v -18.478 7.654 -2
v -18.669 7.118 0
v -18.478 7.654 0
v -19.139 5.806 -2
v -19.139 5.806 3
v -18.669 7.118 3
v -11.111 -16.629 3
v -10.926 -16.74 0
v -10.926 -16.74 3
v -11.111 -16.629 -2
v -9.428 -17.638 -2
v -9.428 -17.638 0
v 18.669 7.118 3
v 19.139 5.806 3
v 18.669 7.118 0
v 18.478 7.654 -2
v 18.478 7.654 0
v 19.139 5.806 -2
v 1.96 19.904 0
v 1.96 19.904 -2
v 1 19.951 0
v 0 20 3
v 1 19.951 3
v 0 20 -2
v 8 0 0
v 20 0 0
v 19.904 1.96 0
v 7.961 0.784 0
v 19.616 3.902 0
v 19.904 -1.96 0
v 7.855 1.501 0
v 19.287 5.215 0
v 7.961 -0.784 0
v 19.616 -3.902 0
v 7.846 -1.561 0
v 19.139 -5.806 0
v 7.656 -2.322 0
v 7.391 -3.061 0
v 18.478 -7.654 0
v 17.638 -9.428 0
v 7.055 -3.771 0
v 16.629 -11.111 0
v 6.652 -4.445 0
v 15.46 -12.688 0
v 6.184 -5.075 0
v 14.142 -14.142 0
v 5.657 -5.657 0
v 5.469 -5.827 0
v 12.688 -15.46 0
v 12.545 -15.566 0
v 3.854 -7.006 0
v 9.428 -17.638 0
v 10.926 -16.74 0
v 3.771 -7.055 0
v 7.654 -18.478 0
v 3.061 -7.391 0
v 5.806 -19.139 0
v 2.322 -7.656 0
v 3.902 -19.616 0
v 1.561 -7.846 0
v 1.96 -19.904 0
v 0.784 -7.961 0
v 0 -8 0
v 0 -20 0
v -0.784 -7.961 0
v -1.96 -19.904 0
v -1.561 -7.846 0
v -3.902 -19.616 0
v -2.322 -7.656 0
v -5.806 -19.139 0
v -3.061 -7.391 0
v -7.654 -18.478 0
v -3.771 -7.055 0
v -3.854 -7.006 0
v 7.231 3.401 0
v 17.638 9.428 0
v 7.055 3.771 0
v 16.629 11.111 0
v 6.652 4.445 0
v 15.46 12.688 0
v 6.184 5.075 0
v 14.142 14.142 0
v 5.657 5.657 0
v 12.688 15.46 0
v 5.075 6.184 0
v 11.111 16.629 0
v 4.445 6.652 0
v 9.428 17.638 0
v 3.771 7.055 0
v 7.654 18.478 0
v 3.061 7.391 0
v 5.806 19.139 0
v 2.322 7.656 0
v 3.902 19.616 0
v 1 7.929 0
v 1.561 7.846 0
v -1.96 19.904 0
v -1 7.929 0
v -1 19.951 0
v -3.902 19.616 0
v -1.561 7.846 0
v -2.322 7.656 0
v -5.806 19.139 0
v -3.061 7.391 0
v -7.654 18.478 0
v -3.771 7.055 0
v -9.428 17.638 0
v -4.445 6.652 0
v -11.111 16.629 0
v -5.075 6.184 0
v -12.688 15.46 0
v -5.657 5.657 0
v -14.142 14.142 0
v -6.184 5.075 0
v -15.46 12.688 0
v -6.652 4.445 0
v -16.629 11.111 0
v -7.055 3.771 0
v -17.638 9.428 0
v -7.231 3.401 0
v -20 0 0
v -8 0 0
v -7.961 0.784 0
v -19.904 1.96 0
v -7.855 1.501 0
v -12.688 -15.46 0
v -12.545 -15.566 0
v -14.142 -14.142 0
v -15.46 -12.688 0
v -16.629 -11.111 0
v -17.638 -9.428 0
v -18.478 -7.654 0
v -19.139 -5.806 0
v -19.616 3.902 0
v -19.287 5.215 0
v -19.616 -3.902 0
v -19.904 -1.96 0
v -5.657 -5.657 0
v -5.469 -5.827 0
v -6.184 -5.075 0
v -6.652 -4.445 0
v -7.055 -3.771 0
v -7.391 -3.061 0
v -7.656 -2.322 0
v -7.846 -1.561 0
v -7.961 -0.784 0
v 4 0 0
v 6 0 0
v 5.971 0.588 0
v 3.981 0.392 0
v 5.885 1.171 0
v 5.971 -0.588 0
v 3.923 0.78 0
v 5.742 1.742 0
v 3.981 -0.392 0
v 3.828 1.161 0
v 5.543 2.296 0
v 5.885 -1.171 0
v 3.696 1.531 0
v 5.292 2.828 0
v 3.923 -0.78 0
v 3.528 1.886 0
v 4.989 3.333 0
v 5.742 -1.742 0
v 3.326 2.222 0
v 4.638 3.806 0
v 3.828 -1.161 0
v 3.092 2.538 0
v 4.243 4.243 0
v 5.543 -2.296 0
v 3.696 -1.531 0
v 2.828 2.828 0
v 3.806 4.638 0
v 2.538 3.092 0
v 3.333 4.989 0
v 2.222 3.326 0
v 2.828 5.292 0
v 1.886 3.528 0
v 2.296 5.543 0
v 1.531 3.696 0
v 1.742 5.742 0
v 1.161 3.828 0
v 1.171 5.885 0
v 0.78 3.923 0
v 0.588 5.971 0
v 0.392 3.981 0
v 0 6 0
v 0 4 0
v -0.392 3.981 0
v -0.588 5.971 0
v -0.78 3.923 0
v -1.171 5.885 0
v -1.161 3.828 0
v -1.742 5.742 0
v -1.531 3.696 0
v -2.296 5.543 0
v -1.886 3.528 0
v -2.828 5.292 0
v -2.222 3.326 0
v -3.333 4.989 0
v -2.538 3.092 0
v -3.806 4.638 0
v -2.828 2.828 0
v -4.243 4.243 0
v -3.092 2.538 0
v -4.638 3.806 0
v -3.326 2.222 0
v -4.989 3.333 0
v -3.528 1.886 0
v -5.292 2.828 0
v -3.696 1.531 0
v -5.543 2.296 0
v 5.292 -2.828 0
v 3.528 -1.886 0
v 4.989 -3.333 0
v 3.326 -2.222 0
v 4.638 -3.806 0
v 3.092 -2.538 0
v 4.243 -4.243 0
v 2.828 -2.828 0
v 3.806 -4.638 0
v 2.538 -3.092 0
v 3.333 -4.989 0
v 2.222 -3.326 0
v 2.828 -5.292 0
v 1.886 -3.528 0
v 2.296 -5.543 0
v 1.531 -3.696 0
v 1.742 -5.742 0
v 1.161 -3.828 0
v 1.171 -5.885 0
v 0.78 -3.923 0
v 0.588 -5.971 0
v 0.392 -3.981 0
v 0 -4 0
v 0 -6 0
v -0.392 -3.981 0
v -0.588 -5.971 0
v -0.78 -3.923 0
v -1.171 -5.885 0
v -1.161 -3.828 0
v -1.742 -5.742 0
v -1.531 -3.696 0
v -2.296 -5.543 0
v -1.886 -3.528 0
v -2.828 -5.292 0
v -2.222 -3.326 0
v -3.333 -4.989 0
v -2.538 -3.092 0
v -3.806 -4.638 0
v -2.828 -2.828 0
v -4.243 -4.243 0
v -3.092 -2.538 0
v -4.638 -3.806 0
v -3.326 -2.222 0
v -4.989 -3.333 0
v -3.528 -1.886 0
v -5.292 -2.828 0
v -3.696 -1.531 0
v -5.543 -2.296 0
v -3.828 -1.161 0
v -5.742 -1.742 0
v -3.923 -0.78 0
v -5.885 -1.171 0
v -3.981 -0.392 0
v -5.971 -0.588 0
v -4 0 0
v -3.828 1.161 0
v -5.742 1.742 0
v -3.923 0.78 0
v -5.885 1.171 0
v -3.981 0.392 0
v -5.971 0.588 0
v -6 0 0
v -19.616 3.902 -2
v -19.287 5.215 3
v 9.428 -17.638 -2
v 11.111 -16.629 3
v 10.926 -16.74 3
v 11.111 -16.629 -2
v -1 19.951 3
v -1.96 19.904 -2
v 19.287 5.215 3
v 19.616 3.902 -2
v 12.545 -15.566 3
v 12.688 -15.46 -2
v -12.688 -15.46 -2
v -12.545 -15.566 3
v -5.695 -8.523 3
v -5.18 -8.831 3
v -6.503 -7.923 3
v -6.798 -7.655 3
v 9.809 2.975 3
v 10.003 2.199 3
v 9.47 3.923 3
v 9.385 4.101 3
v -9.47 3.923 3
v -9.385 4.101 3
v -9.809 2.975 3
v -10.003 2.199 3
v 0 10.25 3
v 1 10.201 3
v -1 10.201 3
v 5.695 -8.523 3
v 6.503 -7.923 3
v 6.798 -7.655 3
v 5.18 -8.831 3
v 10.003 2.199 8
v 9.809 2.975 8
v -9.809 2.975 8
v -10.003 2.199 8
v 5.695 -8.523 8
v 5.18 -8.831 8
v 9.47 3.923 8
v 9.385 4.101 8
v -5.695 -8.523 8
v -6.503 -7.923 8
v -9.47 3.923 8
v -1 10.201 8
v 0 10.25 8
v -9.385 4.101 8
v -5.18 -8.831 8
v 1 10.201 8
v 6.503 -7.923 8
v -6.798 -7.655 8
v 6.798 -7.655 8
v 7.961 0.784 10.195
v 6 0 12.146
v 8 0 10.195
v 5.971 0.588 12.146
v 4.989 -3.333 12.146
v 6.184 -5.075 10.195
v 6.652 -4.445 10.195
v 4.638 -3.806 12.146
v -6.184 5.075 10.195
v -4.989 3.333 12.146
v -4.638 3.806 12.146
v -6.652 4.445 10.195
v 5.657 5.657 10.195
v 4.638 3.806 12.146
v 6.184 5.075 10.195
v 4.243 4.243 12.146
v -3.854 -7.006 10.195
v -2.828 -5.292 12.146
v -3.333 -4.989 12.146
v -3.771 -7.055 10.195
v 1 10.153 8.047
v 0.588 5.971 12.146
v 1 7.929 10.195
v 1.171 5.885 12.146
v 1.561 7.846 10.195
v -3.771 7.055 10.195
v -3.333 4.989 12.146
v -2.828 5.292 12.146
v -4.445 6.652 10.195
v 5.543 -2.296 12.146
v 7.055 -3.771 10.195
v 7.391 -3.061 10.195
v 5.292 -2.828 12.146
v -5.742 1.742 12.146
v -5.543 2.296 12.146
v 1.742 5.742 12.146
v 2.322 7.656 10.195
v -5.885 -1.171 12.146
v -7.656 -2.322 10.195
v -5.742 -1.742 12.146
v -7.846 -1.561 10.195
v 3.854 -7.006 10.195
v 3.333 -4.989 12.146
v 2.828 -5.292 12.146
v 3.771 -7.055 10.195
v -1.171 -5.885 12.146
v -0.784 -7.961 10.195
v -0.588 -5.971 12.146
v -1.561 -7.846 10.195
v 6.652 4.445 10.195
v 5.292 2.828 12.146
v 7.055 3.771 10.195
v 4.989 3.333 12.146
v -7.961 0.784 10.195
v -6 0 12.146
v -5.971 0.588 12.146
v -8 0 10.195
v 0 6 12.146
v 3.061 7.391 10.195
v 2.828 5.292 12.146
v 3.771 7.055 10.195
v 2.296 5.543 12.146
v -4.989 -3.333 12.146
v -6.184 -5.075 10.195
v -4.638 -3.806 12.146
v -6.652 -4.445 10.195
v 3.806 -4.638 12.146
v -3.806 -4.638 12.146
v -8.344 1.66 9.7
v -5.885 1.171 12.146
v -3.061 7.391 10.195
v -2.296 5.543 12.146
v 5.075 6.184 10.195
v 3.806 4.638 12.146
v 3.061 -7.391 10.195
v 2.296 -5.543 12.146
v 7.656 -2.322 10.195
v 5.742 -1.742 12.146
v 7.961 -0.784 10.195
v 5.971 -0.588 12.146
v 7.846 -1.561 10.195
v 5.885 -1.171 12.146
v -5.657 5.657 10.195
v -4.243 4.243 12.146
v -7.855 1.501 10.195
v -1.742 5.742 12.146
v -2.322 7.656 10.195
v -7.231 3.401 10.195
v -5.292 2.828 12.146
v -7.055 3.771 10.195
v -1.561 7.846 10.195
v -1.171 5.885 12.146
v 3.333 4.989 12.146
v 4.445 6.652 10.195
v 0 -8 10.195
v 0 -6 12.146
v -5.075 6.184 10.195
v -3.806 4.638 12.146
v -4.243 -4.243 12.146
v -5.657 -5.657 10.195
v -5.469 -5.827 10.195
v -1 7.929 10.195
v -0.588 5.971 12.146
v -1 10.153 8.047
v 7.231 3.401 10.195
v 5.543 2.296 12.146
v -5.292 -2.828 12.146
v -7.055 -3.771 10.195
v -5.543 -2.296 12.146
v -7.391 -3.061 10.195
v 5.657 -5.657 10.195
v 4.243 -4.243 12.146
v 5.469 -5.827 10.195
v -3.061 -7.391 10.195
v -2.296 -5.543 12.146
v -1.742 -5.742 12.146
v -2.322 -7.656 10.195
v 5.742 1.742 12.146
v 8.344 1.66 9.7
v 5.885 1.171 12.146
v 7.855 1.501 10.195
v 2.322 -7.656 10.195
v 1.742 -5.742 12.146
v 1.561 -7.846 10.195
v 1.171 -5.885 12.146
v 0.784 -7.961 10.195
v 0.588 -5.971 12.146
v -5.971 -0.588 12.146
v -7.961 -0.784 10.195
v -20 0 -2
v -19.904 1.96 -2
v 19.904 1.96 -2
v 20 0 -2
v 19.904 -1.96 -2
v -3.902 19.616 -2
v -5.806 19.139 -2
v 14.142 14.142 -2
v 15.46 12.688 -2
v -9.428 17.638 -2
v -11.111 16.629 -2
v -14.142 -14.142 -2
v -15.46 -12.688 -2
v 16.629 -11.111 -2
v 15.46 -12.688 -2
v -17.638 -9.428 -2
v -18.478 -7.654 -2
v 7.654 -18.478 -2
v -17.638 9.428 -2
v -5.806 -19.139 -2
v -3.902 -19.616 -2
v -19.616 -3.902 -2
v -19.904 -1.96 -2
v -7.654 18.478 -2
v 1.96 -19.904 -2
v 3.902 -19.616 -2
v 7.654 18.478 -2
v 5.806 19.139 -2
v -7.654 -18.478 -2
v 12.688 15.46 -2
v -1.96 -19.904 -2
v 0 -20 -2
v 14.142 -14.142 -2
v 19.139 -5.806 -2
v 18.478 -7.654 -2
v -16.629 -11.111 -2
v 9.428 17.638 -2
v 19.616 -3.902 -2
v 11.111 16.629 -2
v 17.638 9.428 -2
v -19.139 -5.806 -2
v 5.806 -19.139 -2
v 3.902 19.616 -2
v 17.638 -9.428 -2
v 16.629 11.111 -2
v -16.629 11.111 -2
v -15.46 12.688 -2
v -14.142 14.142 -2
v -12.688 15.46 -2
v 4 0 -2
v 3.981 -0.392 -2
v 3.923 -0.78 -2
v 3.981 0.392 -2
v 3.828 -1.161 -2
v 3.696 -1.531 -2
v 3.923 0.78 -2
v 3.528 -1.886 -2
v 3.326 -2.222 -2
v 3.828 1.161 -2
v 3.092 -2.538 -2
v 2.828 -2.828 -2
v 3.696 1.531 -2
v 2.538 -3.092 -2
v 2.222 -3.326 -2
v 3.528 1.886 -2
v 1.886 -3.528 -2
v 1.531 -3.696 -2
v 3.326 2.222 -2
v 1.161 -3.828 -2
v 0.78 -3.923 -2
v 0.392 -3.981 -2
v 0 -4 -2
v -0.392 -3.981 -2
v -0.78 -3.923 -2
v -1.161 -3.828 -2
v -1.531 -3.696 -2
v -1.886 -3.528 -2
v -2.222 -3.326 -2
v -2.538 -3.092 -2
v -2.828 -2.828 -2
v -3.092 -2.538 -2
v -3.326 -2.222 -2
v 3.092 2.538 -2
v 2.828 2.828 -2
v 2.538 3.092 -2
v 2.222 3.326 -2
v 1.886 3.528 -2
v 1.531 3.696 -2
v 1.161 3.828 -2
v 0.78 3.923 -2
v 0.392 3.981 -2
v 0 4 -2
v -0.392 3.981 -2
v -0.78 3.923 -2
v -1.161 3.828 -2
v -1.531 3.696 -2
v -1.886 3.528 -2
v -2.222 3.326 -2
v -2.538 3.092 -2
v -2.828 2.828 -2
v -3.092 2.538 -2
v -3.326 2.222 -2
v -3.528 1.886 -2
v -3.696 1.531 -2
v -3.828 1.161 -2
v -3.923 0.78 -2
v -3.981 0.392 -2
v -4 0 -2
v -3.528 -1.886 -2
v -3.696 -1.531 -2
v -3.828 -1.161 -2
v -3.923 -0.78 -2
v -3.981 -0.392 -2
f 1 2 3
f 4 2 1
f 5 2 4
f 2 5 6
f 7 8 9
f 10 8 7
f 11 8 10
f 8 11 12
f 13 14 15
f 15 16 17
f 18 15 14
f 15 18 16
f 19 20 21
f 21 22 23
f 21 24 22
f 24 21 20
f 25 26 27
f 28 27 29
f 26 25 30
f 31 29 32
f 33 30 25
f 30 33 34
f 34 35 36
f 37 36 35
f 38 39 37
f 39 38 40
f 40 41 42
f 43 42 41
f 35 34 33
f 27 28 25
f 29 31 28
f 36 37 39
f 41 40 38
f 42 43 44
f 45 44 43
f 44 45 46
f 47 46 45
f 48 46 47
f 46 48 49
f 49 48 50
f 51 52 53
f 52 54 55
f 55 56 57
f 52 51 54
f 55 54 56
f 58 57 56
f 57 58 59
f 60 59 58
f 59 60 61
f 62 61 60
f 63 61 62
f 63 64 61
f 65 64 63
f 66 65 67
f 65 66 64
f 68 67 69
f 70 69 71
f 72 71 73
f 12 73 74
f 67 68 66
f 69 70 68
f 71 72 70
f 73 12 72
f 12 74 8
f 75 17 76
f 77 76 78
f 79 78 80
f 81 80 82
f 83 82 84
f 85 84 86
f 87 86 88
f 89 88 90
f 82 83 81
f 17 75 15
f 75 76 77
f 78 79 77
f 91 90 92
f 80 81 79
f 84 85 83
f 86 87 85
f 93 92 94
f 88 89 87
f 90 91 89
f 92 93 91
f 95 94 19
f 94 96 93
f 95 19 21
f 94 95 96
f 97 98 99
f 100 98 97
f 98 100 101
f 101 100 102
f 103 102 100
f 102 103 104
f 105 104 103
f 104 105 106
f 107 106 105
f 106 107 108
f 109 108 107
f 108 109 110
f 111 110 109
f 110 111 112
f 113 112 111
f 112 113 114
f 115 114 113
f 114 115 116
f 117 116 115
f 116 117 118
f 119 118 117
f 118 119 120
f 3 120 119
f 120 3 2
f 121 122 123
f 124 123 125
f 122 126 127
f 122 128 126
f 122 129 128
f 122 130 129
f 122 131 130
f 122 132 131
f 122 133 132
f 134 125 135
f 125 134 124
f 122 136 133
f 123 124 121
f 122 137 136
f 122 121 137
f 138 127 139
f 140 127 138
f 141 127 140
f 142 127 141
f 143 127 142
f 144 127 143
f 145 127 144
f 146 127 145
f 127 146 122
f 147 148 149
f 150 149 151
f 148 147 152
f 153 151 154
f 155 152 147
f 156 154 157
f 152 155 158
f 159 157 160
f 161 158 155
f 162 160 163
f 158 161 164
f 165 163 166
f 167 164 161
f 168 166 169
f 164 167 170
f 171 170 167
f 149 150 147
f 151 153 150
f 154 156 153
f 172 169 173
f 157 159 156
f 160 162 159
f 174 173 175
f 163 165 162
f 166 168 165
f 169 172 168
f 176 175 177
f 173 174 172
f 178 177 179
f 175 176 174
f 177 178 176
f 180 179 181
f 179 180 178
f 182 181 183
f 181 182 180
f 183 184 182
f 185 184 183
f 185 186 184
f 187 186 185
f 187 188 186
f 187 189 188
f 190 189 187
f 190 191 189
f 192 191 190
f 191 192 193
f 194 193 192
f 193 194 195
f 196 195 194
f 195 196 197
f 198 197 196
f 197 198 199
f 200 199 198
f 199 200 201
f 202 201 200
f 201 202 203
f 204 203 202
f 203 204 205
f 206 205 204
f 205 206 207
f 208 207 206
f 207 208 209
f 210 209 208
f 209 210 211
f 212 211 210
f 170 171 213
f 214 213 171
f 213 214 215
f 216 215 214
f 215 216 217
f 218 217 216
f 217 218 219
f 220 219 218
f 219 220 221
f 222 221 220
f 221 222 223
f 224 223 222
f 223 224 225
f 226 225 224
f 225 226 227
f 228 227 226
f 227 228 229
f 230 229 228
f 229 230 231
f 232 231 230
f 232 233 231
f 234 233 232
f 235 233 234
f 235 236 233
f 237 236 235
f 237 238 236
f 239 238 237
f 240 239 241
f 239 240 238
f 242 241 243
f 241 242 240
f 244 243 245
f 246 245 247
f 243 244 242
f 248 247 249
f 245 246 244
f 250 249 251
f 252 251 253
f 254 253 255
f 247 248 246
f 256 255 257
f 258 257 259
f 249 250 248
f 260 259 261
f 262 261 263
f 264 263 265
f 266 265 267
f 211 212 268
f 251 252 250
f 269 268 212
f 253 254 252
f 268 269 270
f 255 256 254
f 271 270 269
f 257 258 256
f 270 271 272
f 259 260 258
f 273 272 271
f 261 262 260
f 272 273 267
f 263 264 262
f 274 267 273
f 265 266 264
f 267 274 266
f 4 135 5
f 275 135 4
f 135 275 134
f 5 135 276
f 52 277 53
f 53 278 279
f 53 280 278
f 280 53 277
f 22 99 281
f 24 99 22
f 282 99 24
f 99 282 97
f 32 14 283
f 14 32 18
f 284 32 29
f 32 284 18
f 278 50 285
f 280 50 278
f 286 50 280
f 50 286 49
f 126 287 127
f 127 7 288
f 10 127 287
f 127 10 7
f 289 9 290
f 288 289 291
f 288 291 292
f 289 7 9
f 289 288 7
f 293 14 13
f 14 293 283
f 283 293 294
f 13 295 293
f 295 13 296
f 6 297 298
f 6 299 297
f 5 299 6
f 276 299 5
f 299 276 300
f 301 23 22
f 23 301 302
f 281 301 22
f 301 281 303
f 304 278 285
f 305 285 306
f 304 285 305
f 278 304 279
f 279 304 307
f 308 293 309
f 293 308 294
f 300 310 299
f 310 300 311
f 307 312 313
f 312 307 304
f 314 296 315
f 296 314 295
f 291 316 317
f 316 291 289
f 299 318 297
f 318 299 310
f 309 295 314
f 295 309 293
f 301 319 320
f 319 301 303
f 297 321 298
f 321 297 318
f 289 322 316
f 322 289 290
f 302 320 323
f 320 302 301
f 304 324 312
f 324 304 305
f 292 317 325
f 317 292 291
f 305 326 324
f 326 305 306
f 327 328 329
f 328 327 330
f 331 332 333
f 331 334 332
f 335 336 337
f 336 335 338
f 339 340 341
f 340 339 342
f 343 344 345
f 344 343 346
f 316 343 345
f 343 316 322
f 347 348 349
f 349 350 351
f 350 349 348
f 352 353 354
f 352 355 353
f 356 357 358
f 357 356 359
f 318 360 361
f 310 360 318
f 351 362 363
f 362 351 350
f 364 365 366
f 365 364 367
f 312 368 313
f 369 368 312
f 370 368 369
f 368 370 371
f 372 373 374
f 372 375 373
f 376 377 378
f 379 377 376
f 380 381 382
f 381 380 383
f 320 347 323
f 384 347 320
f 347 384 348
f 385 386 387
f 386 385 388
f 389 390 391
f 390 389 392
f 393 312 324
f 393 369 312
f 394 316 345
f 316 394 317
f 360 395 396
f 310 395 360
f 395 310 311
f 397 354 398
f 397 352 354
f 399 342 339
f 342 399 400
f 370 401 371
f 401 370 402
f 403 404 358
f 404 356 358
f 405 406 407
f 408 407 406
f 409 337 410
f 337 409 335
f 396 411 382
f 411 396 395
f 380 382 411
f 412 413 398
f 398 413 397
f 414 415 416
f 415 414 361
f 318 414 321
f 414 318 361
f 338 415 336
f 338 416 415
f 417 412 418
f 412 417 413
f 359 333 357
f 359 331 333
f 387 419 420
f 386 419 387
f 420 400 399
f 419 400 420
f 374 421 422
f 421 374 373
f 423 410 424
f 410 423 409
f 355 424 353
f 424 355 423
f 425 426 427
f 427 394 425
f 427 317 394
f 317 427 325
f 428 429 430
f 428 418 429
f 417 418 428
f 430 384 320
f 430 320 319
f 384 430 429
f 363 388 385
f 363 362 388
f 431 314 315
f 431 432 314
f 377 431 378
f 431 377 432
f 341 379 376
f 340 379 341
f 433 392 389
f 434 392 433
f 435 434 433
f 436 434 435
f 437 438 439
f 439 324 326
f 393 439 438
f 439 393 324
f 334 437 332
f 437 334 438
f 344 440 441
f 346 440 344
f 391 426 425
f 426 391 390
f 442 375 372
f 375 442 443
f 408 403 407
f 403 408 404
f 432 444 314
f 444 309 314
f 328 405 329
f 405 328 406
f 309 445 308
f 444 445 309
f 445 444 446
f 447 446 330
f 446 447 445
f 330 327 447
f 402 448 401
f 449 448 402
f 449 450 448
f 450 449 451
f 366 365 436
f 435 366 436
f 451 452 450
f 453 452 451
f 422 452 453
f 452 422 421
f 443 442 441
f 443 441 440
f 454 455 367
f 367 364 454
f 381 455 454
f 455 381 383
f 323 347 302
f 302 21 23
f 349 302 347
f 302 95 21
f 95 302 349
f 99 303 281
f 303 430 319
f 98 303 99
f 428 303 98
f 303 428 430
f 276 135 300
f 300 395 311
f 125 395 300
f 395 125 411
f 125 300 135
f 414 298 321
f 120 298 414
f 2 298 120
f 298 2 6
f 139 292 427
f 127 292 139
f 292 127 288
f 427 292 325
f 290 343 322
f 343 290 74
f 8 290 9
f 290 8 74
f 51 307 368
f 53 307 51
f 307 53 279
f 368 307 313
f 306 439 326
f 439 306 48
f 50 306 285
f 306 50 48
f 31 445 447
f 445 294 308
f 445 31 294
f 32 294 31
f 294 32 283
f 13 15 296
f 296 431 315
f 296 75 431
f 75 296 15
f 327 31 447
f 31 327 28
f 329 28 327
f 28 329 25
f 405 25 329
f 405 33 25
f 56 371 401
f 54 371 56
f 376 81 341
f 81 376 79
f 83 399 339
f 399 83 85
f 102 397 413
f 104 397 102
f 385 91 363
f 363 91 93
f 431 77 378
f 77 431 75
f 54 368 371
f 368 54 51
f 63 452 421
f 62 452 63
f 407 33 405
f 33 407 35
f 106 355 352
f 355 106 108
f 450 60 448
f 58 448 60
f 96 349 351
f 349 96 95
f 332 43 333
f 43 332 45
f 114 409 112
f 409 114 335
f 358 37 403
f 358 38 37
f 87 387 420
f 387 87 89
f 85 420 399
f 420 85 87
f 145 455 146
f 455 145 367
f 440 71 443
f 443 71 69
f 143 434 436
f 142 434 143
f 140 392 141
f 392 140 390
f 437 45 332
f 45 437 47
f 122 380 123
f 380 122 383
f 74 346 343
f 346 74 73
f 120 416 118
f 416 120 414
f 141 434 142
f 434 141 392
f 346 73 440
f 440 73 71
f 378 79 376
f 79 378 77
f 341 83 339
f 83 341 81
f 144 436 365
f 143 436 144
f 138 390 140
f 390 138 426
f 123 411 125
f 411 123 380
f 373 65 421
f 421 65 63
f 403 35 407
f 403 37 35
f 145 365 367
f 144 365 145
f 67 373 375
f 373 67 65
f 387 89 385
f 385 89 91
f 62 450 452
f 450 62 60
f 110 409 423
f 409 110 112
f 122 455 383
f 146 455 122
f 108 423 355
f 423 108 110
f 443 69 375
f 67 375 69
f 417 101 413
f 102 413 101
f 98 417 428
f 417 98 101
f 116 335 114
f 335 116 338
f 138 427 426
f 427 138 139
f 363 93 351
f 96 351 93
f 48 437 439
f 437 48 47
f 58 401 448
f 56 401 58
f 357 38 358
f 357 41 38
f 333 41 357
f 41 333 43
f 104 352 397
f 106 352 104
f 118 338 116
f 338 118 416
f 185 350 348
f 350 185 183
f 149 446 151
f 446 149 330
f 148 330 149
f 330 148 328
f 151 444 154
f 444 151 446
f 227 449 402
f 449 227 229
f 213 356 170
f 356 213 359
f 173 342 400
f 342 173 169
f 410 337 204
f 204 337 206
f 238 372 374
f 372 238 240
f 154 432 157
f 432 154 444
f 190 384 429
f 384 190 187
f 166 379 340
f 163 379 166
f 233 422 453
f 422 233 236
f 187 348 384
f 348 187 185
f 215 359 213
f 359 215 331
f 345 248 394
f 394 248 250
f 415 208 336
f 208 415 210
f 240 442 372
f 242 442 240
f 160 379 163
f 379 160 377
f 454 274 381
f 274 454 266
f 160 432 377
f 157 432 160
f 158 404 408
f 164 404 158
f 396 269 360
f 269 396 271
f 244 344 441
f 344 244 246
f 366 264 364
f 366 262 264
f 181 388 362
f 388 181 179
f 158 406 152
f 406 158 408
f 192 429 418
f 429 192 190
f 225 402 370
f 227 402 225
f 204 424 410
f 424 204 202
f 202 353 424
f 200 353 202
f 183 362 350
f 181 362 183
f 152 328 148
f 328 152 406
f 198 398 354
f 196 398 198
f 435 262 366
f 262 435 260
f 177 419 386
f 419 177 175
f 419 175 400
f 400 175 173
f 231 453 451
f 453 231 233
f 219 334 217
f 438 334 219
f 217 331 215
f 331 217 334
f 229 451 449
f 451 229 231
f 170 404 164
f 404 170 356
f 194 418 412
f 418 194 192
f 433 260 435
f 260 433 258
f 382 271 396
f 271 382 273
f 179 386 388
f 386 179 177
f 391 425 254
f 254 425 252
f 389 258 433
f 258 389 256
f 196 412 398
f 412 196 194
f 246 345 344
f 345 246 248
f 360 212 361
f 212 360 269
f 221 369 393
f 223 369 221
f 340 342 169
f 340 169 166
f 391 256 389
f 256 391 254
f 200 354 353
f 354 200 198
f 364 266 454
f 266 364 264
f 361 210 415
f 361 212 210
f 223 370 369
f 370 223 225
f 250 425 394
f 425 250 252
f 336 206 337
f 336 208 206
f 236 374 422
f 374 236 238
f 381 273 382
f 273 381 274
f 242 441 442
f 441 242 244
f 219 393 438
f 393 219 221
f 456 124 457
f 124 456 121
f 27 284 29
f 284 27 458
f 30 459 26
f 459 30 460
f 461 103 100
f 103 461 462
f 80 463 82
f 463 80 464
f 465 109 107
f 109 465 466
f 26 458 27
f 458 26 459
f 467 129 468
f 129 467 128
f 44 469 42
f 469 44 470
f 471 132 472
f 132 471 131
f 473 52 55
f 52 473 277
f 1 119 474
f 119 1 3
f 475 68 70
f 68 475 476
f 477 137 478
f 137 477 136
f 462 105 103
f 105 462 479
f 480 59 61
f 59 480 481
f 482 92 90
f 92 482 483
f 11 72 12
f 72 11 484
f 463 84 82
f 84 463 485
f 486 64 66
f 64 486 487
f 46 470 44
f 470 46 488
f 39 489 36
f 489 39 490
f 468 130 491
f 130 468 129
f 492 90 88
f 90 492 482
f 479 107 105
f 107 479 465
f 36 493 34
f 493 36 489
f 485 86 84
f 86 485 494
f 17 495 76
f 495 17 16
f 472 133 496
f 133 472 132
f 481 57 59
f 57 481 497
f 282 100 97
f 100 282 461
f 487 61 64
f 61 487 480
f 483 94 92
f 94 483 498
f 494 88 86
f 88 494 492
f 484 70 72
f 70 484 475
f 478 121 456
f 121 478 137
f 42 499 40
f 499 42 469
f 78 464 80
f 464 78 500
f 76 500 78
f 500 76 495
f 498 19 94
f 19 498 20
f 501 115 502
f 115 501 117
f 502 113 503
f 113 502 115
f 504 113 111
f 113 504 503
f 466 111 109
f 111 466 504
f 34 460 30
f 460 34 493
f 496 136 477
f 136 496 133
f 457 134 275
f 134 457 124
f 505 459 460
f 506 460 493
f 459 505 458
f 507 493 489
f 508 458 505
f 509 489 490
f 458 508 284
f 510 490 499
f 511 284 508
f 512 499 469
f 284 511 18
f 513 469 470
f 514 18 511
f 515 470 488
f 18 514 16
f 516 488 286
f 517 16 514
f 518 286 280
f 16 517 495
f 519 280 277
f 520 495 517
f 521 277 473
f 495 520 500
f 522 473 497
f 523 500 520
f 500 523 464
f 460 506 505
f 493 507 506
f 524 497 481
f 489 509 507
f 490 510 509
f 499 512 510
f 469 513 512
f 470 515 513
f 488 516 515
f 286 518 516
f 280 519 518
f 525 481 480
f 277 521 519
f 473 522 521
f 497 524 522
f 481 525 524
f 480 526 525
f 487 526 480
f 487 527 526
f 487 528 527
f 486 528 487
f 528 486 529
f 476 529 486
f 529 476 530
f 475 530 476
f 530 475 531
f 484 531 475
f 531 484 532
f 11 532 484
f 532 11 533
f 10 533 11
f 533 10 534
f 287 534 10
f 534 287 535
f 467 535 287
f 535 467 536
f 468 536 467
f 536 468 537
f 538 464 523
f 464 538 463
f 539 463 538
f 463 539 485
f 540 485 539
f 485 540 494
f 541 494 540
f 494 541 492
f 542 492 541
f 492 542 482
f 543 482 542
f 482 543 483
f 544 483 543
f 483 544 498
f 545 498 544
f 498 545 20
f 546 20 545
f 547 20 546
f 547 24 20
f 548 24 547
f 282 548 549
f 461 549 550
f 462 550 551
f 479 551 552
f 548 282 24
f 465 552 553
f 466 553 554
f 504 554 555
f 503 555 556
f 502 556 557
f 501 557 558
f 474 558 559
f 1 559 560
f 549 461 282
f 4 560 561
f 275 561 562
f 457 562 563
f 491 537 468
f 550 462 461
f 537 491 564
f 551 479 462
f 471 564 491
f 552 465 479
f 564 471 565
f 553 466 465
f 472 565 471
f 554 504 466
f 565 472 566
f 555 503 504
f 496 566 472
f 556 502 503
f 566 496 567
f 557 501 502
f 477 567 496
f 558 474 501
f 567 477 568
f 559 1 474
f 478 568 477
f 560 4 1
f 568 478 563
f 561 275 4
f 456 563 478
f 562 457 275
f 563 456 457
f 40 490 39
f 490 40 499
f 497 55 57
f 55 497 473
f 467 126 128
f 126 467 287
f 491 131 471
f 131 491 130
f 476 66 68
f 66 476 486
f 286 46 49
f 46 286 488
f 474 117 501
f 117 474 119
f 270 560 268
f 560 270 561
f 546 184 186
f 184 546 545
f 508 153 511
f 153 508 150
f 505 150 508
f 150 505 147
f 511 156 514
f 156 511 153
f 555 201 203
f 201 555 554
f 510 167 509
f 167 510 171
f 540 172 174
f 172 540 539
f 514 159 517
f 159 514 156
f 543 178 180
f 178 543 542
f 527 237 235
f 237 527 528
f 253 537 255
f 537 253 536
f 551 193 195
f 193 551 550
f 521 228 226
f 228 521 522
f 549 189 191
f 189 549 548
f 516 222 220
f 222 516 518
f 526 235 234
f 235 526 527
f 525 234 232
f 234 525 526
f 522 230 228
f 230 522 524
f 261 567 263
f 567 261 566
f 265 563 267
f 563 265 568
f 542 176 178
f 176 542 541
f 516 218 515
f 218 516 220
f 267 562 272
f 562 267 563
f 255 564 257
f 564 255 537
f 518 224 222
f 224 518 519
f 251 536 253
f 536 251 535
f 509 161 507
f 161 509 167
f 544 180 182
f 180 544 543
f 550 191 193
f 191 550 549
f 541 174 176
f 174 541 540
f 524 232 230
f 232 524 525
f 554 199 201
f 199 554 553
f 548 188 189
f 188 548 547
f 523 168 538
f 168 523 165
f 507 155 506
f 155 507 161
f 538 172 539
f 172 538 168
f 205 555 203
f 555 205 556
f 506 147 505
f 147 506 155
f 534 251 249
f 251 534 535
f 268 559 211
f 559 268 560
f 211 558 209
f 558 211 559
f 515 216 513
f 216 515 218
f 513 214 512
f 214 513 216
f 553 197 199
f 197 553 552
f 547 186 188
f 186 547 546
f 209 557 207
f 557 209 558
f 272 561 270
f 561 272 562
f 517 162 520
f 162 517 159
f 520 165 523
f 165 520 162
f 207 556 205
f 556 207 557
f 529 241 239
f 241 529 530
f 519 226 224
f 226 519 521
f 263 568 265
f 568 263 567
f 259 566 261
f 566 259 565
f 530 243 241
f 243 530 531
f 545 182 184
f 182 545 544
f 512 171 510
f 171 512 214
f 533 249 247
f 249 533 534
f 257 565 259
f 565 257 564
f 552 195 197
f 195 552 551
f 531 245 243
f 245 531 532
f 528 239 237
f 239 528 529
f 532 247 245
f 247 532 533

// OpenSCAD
// Center column dev tank adapter
// Project: shooting tutorial video for oatl
$fn=64;
d1=40;
d2=20.5;
d3=12;
d4=8;
h1=3;
h2=5;
h3=10;
n=5;
wall=2;
module legs() {
  intersection() {
    union() {
      cylinder(h=h1,d=d1);
      translate([0,0,h1]) cylinder(h=h2,d=d2);
      translate([0,0,h1+h2]) cylinder(h=h3,d1=d2,d2=0);
    }
    union() {
      for (a=[0:360/n:360]) rotate([0,0,a]) translate([-wall/2,0,0]) cube([wall,d1,h1+h2+h3]);
      cylinder(d=d3+2*wall,h=h1+h2+h3);
    }
  }
}
difference() {
  legs();
  cylinder(d=d3,h=h1+h2+h3);
}
translate([0,0,-wall]) difference() {
    cylinder(h=wall,d=d1);
    cylinder(h=wall,d=d4);
  }
